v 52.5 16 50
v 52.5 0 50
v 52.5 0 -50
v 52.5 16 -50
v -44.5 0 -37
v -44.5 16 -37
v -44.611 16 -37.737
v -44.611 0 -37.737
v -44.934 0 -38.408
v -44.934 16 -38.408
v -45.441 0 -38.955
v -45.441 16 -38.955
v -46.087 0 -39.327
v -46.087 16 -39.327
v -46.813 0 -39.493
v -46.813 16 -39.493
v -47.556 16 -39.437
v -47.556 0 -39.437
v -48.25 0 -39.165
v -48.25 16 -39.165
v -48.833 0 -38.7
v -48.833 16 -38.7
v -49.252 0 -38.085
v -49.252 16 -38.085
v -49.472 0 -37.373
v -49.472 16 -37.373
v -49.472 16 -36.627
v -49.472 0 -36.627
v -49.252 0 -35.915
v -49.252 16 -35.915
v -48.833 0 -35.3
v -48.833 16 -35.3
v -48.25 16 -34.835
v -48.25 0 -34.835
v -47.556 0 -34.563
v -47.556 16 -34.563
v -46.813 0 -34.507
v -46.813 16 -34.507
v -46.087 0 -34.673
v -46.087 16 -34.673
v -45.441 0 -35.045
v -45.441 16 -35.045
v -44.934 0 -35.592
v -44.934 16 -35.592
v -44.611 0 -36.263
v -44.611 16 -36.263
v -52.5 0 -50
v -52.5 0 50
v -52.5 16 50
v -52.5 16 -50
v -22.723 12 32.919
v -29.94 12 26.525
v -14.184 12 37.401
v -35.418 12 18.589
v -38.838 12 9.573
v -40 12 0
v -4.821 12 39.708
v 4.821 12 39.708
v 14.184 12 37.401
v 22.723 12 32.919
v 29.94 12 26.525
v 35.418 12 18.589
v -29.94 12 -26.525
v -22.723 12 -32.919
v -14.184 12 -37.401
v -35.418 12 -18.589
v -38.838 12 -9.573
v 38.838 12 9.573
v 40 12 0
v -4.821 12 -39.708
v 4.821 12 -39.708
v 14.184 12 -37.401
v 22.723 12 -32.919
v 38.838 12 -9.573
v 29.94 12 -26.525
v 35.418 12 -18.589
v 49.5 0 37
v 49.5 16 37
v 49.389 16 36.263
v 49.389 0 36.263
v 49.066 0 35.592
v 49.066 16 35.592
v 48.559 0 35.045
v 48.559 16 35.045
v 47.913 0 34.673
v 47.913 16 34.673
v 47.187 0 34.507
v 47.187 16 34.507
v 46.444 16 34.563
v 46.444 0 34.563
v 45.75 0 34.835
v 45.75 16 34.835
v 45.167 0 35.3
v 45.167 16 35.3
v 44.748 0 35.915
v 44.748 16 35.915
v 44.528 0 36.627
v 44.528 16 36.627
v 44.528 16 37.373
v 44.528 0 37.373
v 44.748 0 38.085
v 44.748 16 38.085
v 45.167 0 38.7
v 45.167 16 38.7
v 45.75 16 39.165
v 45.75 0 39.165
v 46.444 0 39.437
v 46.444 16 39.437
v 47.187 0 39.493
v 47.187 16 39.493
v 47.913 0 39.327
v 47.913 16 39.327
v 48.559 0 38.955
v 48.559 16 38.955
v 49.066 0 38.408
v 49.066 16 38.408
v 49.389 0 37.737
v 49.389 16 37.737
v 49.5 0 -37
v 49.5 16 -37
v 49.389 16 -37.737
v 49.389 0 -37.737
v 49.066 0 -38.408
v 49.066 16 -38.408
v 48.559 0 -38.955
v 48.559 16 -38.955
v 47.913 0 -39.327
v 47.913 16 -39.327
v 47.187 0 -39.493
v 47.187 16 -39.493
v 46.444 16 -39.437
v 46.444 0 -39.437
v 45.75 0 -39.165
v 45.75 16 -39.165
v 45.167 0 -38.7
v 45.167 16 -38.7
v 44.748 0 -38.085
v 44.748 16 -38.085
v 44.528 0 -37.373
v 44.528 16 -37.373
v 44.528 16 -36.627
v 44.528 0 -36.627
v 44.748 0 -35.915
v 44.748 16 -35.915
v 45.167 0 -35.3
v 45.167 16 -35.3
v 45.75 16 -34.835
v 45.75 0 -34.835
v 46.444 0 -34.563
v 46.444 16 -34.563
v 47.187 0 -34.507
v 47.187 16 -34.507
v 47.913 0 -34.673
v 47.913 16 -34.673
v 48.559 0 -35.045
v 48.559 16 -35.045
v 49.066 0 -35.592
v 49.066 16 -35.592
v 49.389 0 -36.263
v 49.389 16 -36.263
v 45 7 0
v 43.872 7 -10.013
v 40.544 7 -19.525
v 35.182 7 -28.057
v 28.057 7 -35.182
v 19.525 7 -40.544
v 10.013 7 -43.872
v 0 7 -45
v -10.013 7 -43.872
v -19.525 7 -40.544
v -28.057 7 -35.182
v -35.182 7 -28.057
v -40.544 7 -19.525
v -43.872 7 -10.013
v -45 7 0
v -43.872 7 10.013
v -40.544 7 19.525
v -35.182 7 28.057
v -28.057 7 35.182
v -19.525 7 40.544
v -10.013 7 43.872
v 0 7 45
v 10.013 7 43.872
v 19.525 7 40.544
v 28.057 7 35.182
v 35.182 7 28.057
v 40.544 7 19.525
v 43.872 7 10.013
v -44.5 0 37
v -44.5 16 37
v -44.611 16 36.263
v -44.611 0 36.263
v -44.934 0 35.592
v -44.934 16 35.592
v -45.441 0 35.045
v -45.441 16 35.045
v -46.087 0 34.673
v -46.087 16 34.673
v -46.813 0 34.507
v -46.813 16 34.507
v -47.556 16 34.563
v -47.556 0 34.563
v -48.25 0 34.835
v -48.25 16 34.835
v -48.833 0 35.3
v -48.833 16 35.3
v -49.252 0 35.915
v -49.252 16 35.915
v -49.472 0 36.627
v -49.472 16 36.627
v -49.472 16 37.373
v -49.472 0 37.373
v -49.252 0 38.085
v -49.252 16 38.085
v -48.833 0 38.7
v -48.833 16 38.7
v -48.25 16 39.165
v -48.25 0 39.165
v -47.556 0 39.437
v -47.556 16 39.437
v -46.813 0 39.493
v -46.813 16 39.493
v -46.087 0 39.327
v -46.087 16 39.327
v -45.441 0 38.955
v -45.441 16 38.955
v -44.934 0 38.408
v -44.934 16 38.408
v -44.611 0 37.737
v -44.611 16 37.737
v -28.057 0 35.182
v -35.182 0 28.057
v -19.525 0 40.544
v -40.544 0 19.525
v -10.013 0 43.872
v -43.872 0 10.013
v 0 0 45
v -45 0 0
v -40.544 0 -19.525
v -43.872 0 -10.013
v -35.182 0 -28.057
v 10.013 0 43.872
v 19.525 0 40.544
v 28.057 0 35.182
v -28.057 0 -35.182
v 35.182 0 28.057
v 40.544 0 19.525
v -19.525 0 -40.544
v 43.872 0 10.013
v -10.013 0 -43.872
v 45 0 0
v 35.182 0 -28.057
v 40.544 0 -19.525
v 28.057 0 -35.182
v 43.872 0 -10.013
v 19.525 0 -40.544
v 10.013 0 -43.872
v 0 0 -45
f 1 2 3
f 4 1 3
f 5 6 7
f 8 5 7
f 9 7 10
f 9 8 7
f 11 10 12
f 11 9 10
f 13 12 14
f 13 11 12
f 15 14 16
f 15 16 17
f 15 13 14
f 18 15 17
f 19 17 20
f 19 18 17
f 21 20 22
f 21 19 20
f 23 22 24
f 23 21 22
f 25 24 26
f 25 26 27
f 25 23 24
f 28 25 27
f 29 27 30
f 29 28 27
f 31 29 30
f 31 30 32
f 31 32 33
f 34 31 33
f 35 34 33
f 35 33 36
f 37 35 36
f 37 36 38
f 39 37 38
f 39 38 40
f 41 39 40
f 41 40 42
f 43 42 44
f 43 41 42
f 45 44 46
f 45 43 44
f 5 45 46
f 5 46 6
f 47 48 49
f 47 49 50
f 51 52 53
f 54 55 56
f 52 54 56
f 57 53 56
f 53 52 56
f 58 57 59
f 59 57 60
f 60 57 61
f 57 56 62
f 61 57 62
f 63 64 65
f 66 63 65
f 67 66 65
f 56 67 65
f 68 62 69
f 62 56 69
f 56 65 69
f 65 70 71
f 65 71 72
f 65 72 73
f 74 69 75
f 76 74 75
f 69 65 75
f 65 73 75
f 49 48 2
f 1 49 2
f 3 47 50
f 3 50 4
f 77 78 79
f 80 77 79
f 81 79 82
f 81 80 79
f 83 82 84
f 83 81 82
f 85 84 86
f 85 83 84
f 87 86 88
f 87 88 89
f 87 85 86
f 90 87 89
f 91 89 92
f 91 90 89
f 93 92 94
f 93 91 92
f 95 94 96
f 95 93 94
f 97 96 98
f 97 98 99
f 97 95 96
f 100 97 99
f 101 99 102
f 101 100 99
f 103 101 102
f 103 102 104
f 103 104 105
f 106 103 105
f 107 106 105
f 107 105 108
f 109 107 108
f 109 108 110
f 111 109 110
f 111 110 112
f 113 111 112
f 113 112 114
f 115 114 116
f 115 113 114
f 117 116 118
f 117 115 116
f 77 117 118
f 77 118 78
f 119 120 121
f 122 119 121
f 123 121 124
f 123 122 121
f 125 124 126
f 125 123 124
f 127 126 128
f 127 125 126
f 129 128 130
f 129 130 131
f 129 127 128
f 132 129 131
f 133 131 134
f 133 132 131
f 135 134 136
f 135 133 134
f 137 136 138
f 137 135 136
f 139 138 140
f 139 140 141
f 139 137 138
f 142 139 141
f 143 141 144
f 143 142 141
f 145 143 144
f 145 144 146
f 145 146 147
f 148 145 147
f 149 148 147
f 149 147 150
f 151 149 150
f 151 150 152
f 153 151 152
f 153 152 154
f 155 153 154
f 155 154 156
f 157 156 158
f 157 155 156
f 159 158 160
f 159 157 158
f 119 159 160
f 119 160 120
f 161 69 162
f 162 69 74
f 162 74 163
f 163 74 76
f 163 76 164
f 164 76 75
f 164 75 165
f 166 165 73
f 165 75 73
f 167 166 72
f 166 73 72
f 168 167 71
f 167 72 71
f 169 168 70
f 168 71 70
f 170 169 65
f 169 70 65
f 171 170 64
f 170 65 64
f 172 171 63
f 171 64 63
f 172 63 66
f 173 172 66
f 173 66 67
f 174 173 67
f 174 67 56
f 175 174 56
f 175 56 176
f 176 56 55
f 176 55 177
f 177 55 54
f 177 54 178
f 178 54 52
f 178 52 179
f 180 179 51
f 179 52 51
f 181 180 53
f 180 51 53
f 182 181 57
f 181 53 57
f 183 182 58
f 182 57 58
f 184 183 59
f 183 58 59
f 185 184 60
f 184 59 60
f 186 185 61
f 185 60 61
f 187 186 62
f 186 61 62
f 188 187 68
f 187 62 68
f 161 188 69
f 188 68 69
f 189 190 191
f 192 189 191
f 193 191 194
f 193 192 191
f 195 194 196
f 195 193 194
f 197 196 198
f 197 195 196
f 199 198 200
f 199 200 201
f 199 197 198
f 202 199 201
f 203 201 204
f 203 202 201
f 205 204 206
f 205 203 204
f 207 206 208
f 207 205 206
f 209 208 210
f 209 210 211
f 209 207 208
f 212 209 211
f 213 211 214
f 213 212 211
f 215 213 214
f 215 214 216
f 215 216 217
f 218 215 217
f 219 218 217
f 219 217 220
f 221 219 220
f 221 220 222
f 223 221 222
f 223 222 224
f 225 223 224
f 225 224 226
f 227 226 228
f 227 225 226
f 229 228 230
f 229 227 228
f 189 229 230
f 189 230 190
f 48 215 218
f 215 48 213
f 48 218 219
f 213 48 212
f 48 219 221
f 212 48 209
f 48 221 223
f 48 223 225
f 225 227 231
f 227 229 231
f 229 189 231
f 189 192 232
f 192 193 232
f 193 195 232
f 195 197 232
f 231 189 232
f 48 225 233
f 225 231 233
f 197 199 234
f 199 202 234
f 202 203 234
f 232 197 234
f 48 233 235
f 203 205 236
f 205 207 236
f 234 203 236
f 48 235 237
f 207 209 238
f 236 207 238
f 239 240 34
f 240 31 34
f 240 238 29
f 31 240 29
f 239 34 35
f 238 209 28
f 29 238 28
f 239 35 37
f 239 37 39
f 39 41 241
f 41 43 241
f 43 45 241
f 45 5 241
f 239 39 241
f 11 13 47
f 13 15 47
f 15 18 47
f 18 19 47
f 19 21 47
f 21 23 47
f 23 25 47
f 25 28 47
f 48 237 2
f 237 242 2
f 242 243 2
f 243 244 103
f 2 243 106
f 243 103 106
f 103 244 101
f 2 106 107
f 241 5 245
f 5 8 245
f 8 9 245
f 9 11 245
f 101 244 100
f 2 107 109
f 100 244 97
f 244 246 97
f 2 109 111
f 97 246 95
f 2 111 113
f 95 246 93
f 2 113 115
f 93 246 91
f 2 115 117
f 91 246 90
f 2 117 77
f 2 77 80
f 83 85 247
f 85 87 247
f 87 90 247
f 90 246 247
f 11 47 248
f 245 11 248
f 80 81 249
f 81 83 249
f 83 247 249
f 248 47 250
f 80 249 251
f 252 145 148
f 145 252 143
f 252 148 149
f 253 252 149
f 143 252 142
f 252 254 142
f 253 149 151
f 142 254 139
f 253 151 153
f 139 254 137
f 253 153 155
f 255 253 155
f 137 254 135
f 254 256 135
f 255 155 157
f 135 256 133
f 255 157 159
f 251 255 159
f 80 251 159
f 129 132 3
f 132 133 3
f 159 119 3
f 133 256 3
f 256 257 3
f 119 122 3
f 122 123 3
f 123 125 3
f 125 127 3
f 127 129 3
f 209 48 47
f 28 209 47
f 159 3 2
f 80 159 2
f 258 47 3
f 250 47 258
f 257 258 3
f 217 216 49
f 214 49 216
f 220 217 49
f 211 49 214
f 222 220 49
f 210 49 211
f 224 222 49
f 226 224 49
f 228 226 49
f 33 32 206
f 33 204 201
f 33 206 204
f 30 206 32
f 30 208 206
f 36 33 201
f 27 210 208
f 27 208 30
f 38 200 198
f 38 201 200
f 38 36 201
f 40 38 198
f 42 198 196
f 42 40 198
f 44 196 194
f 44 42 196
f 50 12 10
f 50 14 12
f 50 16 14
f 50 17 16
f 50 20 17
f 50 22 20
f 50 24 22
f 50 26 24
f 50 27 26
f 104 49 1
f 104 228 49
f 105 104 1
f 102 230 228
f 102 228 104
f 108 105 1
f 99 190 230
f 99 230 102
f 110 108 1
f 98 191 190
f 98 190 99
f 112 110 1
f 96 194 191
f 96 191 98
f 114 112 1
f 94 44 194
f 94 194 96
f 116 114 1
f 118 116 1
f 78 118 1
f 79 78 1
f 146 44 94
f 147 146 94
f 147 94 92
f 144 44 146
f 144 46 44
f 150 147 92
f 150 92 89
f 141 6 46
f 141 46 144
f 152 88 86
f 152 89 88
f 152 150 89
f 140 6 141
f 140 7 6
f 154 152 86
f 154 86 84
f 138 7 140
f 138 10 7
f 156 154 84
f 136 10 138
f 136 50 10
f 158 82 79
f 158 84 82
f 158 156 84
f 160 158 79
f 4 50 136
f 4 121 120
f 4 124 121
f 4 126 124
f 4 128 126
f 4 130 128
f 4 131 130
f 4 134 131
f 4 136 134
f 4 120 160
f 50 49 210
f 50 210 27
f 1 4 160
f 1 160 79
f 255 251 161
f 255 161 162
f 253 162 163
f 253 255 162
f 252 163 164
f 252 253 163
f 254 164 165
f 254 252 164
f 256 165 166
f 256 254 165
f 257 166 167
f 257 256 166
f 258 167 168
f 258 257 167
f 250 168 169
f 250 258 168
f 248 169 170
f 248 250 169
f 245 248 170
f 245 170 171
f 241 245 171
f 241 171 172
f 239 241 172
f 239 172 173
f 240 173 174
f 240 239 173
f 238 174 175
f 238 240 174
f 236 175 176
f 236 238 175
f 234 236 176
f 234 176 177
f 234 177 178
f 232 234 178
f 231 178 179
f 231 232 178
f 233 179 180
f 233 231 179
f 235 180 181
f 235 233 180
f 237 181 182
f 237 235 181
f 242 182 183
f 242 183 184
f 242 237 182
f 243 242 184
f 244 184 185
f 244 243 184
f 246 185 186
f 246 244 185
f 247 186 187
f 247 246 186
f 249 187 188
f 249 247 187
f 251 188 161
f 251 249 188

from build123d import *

# Parameters (mm, degrees)
SKETCH1_W           = 105
SKETCH1_H           = 100
SKETCH1_R           = 2.5
BOSS_EXTRUDE2_DEPTH = 16
SKETCH2_R           = 45
CUT_EXTRUDE1_DEPTH  = 12
CHAMFER1_SIZE       = 5


with BuildPart() as part:
    # Sketch1 → Boss-Extrude2 (new body)
    with BuildSketch(Plane(origin=(0, 0, 0), x_dir=(1, 0, 0), z_dir=(0, 1, 0))):
        Rectangle(SKETCH1_W, SKETCH1_H)
        with Locations((47, -37)):
            Circle(SKETCH1_R, mode=Mode.SUBTRACT)
        with Locations((47, 37)):
            Circle(SKETCH1_R, mode=Mode.SUBTRACT)
        with Locations((-47, 37)):
            Circle(SKETCH1_R, mode=Mode.SUBTRACT)
        with Locations((-47, -37)):
            Circle(SKETCH1_R, mode=Mode.SUBTRACT)
    extrude(amount=BOSS_EXTRUDE2_DEPTH)

    # Sketch2 → Cut-Extrude1 (cut)
    with BuildSketch(Plane(origin=(0, 0, 0), x_dir=(1, 0, 0), z_dir=(0, 1, 0))):
        Circle(SKETCH2_R)
    extrude(amount=CUT_EXTRUDE1_DEPTH, mode=Mode.SUBTRACT)

    # Chamfer1
    chamfer1_edges = [part.edges().sort_by_distance(p)[0] for p in [
        (-45, 12, 0),
    ]]
    chamfer(chamfer1_edges, length=CHAMFER1_SIZE)


solid = part.part
